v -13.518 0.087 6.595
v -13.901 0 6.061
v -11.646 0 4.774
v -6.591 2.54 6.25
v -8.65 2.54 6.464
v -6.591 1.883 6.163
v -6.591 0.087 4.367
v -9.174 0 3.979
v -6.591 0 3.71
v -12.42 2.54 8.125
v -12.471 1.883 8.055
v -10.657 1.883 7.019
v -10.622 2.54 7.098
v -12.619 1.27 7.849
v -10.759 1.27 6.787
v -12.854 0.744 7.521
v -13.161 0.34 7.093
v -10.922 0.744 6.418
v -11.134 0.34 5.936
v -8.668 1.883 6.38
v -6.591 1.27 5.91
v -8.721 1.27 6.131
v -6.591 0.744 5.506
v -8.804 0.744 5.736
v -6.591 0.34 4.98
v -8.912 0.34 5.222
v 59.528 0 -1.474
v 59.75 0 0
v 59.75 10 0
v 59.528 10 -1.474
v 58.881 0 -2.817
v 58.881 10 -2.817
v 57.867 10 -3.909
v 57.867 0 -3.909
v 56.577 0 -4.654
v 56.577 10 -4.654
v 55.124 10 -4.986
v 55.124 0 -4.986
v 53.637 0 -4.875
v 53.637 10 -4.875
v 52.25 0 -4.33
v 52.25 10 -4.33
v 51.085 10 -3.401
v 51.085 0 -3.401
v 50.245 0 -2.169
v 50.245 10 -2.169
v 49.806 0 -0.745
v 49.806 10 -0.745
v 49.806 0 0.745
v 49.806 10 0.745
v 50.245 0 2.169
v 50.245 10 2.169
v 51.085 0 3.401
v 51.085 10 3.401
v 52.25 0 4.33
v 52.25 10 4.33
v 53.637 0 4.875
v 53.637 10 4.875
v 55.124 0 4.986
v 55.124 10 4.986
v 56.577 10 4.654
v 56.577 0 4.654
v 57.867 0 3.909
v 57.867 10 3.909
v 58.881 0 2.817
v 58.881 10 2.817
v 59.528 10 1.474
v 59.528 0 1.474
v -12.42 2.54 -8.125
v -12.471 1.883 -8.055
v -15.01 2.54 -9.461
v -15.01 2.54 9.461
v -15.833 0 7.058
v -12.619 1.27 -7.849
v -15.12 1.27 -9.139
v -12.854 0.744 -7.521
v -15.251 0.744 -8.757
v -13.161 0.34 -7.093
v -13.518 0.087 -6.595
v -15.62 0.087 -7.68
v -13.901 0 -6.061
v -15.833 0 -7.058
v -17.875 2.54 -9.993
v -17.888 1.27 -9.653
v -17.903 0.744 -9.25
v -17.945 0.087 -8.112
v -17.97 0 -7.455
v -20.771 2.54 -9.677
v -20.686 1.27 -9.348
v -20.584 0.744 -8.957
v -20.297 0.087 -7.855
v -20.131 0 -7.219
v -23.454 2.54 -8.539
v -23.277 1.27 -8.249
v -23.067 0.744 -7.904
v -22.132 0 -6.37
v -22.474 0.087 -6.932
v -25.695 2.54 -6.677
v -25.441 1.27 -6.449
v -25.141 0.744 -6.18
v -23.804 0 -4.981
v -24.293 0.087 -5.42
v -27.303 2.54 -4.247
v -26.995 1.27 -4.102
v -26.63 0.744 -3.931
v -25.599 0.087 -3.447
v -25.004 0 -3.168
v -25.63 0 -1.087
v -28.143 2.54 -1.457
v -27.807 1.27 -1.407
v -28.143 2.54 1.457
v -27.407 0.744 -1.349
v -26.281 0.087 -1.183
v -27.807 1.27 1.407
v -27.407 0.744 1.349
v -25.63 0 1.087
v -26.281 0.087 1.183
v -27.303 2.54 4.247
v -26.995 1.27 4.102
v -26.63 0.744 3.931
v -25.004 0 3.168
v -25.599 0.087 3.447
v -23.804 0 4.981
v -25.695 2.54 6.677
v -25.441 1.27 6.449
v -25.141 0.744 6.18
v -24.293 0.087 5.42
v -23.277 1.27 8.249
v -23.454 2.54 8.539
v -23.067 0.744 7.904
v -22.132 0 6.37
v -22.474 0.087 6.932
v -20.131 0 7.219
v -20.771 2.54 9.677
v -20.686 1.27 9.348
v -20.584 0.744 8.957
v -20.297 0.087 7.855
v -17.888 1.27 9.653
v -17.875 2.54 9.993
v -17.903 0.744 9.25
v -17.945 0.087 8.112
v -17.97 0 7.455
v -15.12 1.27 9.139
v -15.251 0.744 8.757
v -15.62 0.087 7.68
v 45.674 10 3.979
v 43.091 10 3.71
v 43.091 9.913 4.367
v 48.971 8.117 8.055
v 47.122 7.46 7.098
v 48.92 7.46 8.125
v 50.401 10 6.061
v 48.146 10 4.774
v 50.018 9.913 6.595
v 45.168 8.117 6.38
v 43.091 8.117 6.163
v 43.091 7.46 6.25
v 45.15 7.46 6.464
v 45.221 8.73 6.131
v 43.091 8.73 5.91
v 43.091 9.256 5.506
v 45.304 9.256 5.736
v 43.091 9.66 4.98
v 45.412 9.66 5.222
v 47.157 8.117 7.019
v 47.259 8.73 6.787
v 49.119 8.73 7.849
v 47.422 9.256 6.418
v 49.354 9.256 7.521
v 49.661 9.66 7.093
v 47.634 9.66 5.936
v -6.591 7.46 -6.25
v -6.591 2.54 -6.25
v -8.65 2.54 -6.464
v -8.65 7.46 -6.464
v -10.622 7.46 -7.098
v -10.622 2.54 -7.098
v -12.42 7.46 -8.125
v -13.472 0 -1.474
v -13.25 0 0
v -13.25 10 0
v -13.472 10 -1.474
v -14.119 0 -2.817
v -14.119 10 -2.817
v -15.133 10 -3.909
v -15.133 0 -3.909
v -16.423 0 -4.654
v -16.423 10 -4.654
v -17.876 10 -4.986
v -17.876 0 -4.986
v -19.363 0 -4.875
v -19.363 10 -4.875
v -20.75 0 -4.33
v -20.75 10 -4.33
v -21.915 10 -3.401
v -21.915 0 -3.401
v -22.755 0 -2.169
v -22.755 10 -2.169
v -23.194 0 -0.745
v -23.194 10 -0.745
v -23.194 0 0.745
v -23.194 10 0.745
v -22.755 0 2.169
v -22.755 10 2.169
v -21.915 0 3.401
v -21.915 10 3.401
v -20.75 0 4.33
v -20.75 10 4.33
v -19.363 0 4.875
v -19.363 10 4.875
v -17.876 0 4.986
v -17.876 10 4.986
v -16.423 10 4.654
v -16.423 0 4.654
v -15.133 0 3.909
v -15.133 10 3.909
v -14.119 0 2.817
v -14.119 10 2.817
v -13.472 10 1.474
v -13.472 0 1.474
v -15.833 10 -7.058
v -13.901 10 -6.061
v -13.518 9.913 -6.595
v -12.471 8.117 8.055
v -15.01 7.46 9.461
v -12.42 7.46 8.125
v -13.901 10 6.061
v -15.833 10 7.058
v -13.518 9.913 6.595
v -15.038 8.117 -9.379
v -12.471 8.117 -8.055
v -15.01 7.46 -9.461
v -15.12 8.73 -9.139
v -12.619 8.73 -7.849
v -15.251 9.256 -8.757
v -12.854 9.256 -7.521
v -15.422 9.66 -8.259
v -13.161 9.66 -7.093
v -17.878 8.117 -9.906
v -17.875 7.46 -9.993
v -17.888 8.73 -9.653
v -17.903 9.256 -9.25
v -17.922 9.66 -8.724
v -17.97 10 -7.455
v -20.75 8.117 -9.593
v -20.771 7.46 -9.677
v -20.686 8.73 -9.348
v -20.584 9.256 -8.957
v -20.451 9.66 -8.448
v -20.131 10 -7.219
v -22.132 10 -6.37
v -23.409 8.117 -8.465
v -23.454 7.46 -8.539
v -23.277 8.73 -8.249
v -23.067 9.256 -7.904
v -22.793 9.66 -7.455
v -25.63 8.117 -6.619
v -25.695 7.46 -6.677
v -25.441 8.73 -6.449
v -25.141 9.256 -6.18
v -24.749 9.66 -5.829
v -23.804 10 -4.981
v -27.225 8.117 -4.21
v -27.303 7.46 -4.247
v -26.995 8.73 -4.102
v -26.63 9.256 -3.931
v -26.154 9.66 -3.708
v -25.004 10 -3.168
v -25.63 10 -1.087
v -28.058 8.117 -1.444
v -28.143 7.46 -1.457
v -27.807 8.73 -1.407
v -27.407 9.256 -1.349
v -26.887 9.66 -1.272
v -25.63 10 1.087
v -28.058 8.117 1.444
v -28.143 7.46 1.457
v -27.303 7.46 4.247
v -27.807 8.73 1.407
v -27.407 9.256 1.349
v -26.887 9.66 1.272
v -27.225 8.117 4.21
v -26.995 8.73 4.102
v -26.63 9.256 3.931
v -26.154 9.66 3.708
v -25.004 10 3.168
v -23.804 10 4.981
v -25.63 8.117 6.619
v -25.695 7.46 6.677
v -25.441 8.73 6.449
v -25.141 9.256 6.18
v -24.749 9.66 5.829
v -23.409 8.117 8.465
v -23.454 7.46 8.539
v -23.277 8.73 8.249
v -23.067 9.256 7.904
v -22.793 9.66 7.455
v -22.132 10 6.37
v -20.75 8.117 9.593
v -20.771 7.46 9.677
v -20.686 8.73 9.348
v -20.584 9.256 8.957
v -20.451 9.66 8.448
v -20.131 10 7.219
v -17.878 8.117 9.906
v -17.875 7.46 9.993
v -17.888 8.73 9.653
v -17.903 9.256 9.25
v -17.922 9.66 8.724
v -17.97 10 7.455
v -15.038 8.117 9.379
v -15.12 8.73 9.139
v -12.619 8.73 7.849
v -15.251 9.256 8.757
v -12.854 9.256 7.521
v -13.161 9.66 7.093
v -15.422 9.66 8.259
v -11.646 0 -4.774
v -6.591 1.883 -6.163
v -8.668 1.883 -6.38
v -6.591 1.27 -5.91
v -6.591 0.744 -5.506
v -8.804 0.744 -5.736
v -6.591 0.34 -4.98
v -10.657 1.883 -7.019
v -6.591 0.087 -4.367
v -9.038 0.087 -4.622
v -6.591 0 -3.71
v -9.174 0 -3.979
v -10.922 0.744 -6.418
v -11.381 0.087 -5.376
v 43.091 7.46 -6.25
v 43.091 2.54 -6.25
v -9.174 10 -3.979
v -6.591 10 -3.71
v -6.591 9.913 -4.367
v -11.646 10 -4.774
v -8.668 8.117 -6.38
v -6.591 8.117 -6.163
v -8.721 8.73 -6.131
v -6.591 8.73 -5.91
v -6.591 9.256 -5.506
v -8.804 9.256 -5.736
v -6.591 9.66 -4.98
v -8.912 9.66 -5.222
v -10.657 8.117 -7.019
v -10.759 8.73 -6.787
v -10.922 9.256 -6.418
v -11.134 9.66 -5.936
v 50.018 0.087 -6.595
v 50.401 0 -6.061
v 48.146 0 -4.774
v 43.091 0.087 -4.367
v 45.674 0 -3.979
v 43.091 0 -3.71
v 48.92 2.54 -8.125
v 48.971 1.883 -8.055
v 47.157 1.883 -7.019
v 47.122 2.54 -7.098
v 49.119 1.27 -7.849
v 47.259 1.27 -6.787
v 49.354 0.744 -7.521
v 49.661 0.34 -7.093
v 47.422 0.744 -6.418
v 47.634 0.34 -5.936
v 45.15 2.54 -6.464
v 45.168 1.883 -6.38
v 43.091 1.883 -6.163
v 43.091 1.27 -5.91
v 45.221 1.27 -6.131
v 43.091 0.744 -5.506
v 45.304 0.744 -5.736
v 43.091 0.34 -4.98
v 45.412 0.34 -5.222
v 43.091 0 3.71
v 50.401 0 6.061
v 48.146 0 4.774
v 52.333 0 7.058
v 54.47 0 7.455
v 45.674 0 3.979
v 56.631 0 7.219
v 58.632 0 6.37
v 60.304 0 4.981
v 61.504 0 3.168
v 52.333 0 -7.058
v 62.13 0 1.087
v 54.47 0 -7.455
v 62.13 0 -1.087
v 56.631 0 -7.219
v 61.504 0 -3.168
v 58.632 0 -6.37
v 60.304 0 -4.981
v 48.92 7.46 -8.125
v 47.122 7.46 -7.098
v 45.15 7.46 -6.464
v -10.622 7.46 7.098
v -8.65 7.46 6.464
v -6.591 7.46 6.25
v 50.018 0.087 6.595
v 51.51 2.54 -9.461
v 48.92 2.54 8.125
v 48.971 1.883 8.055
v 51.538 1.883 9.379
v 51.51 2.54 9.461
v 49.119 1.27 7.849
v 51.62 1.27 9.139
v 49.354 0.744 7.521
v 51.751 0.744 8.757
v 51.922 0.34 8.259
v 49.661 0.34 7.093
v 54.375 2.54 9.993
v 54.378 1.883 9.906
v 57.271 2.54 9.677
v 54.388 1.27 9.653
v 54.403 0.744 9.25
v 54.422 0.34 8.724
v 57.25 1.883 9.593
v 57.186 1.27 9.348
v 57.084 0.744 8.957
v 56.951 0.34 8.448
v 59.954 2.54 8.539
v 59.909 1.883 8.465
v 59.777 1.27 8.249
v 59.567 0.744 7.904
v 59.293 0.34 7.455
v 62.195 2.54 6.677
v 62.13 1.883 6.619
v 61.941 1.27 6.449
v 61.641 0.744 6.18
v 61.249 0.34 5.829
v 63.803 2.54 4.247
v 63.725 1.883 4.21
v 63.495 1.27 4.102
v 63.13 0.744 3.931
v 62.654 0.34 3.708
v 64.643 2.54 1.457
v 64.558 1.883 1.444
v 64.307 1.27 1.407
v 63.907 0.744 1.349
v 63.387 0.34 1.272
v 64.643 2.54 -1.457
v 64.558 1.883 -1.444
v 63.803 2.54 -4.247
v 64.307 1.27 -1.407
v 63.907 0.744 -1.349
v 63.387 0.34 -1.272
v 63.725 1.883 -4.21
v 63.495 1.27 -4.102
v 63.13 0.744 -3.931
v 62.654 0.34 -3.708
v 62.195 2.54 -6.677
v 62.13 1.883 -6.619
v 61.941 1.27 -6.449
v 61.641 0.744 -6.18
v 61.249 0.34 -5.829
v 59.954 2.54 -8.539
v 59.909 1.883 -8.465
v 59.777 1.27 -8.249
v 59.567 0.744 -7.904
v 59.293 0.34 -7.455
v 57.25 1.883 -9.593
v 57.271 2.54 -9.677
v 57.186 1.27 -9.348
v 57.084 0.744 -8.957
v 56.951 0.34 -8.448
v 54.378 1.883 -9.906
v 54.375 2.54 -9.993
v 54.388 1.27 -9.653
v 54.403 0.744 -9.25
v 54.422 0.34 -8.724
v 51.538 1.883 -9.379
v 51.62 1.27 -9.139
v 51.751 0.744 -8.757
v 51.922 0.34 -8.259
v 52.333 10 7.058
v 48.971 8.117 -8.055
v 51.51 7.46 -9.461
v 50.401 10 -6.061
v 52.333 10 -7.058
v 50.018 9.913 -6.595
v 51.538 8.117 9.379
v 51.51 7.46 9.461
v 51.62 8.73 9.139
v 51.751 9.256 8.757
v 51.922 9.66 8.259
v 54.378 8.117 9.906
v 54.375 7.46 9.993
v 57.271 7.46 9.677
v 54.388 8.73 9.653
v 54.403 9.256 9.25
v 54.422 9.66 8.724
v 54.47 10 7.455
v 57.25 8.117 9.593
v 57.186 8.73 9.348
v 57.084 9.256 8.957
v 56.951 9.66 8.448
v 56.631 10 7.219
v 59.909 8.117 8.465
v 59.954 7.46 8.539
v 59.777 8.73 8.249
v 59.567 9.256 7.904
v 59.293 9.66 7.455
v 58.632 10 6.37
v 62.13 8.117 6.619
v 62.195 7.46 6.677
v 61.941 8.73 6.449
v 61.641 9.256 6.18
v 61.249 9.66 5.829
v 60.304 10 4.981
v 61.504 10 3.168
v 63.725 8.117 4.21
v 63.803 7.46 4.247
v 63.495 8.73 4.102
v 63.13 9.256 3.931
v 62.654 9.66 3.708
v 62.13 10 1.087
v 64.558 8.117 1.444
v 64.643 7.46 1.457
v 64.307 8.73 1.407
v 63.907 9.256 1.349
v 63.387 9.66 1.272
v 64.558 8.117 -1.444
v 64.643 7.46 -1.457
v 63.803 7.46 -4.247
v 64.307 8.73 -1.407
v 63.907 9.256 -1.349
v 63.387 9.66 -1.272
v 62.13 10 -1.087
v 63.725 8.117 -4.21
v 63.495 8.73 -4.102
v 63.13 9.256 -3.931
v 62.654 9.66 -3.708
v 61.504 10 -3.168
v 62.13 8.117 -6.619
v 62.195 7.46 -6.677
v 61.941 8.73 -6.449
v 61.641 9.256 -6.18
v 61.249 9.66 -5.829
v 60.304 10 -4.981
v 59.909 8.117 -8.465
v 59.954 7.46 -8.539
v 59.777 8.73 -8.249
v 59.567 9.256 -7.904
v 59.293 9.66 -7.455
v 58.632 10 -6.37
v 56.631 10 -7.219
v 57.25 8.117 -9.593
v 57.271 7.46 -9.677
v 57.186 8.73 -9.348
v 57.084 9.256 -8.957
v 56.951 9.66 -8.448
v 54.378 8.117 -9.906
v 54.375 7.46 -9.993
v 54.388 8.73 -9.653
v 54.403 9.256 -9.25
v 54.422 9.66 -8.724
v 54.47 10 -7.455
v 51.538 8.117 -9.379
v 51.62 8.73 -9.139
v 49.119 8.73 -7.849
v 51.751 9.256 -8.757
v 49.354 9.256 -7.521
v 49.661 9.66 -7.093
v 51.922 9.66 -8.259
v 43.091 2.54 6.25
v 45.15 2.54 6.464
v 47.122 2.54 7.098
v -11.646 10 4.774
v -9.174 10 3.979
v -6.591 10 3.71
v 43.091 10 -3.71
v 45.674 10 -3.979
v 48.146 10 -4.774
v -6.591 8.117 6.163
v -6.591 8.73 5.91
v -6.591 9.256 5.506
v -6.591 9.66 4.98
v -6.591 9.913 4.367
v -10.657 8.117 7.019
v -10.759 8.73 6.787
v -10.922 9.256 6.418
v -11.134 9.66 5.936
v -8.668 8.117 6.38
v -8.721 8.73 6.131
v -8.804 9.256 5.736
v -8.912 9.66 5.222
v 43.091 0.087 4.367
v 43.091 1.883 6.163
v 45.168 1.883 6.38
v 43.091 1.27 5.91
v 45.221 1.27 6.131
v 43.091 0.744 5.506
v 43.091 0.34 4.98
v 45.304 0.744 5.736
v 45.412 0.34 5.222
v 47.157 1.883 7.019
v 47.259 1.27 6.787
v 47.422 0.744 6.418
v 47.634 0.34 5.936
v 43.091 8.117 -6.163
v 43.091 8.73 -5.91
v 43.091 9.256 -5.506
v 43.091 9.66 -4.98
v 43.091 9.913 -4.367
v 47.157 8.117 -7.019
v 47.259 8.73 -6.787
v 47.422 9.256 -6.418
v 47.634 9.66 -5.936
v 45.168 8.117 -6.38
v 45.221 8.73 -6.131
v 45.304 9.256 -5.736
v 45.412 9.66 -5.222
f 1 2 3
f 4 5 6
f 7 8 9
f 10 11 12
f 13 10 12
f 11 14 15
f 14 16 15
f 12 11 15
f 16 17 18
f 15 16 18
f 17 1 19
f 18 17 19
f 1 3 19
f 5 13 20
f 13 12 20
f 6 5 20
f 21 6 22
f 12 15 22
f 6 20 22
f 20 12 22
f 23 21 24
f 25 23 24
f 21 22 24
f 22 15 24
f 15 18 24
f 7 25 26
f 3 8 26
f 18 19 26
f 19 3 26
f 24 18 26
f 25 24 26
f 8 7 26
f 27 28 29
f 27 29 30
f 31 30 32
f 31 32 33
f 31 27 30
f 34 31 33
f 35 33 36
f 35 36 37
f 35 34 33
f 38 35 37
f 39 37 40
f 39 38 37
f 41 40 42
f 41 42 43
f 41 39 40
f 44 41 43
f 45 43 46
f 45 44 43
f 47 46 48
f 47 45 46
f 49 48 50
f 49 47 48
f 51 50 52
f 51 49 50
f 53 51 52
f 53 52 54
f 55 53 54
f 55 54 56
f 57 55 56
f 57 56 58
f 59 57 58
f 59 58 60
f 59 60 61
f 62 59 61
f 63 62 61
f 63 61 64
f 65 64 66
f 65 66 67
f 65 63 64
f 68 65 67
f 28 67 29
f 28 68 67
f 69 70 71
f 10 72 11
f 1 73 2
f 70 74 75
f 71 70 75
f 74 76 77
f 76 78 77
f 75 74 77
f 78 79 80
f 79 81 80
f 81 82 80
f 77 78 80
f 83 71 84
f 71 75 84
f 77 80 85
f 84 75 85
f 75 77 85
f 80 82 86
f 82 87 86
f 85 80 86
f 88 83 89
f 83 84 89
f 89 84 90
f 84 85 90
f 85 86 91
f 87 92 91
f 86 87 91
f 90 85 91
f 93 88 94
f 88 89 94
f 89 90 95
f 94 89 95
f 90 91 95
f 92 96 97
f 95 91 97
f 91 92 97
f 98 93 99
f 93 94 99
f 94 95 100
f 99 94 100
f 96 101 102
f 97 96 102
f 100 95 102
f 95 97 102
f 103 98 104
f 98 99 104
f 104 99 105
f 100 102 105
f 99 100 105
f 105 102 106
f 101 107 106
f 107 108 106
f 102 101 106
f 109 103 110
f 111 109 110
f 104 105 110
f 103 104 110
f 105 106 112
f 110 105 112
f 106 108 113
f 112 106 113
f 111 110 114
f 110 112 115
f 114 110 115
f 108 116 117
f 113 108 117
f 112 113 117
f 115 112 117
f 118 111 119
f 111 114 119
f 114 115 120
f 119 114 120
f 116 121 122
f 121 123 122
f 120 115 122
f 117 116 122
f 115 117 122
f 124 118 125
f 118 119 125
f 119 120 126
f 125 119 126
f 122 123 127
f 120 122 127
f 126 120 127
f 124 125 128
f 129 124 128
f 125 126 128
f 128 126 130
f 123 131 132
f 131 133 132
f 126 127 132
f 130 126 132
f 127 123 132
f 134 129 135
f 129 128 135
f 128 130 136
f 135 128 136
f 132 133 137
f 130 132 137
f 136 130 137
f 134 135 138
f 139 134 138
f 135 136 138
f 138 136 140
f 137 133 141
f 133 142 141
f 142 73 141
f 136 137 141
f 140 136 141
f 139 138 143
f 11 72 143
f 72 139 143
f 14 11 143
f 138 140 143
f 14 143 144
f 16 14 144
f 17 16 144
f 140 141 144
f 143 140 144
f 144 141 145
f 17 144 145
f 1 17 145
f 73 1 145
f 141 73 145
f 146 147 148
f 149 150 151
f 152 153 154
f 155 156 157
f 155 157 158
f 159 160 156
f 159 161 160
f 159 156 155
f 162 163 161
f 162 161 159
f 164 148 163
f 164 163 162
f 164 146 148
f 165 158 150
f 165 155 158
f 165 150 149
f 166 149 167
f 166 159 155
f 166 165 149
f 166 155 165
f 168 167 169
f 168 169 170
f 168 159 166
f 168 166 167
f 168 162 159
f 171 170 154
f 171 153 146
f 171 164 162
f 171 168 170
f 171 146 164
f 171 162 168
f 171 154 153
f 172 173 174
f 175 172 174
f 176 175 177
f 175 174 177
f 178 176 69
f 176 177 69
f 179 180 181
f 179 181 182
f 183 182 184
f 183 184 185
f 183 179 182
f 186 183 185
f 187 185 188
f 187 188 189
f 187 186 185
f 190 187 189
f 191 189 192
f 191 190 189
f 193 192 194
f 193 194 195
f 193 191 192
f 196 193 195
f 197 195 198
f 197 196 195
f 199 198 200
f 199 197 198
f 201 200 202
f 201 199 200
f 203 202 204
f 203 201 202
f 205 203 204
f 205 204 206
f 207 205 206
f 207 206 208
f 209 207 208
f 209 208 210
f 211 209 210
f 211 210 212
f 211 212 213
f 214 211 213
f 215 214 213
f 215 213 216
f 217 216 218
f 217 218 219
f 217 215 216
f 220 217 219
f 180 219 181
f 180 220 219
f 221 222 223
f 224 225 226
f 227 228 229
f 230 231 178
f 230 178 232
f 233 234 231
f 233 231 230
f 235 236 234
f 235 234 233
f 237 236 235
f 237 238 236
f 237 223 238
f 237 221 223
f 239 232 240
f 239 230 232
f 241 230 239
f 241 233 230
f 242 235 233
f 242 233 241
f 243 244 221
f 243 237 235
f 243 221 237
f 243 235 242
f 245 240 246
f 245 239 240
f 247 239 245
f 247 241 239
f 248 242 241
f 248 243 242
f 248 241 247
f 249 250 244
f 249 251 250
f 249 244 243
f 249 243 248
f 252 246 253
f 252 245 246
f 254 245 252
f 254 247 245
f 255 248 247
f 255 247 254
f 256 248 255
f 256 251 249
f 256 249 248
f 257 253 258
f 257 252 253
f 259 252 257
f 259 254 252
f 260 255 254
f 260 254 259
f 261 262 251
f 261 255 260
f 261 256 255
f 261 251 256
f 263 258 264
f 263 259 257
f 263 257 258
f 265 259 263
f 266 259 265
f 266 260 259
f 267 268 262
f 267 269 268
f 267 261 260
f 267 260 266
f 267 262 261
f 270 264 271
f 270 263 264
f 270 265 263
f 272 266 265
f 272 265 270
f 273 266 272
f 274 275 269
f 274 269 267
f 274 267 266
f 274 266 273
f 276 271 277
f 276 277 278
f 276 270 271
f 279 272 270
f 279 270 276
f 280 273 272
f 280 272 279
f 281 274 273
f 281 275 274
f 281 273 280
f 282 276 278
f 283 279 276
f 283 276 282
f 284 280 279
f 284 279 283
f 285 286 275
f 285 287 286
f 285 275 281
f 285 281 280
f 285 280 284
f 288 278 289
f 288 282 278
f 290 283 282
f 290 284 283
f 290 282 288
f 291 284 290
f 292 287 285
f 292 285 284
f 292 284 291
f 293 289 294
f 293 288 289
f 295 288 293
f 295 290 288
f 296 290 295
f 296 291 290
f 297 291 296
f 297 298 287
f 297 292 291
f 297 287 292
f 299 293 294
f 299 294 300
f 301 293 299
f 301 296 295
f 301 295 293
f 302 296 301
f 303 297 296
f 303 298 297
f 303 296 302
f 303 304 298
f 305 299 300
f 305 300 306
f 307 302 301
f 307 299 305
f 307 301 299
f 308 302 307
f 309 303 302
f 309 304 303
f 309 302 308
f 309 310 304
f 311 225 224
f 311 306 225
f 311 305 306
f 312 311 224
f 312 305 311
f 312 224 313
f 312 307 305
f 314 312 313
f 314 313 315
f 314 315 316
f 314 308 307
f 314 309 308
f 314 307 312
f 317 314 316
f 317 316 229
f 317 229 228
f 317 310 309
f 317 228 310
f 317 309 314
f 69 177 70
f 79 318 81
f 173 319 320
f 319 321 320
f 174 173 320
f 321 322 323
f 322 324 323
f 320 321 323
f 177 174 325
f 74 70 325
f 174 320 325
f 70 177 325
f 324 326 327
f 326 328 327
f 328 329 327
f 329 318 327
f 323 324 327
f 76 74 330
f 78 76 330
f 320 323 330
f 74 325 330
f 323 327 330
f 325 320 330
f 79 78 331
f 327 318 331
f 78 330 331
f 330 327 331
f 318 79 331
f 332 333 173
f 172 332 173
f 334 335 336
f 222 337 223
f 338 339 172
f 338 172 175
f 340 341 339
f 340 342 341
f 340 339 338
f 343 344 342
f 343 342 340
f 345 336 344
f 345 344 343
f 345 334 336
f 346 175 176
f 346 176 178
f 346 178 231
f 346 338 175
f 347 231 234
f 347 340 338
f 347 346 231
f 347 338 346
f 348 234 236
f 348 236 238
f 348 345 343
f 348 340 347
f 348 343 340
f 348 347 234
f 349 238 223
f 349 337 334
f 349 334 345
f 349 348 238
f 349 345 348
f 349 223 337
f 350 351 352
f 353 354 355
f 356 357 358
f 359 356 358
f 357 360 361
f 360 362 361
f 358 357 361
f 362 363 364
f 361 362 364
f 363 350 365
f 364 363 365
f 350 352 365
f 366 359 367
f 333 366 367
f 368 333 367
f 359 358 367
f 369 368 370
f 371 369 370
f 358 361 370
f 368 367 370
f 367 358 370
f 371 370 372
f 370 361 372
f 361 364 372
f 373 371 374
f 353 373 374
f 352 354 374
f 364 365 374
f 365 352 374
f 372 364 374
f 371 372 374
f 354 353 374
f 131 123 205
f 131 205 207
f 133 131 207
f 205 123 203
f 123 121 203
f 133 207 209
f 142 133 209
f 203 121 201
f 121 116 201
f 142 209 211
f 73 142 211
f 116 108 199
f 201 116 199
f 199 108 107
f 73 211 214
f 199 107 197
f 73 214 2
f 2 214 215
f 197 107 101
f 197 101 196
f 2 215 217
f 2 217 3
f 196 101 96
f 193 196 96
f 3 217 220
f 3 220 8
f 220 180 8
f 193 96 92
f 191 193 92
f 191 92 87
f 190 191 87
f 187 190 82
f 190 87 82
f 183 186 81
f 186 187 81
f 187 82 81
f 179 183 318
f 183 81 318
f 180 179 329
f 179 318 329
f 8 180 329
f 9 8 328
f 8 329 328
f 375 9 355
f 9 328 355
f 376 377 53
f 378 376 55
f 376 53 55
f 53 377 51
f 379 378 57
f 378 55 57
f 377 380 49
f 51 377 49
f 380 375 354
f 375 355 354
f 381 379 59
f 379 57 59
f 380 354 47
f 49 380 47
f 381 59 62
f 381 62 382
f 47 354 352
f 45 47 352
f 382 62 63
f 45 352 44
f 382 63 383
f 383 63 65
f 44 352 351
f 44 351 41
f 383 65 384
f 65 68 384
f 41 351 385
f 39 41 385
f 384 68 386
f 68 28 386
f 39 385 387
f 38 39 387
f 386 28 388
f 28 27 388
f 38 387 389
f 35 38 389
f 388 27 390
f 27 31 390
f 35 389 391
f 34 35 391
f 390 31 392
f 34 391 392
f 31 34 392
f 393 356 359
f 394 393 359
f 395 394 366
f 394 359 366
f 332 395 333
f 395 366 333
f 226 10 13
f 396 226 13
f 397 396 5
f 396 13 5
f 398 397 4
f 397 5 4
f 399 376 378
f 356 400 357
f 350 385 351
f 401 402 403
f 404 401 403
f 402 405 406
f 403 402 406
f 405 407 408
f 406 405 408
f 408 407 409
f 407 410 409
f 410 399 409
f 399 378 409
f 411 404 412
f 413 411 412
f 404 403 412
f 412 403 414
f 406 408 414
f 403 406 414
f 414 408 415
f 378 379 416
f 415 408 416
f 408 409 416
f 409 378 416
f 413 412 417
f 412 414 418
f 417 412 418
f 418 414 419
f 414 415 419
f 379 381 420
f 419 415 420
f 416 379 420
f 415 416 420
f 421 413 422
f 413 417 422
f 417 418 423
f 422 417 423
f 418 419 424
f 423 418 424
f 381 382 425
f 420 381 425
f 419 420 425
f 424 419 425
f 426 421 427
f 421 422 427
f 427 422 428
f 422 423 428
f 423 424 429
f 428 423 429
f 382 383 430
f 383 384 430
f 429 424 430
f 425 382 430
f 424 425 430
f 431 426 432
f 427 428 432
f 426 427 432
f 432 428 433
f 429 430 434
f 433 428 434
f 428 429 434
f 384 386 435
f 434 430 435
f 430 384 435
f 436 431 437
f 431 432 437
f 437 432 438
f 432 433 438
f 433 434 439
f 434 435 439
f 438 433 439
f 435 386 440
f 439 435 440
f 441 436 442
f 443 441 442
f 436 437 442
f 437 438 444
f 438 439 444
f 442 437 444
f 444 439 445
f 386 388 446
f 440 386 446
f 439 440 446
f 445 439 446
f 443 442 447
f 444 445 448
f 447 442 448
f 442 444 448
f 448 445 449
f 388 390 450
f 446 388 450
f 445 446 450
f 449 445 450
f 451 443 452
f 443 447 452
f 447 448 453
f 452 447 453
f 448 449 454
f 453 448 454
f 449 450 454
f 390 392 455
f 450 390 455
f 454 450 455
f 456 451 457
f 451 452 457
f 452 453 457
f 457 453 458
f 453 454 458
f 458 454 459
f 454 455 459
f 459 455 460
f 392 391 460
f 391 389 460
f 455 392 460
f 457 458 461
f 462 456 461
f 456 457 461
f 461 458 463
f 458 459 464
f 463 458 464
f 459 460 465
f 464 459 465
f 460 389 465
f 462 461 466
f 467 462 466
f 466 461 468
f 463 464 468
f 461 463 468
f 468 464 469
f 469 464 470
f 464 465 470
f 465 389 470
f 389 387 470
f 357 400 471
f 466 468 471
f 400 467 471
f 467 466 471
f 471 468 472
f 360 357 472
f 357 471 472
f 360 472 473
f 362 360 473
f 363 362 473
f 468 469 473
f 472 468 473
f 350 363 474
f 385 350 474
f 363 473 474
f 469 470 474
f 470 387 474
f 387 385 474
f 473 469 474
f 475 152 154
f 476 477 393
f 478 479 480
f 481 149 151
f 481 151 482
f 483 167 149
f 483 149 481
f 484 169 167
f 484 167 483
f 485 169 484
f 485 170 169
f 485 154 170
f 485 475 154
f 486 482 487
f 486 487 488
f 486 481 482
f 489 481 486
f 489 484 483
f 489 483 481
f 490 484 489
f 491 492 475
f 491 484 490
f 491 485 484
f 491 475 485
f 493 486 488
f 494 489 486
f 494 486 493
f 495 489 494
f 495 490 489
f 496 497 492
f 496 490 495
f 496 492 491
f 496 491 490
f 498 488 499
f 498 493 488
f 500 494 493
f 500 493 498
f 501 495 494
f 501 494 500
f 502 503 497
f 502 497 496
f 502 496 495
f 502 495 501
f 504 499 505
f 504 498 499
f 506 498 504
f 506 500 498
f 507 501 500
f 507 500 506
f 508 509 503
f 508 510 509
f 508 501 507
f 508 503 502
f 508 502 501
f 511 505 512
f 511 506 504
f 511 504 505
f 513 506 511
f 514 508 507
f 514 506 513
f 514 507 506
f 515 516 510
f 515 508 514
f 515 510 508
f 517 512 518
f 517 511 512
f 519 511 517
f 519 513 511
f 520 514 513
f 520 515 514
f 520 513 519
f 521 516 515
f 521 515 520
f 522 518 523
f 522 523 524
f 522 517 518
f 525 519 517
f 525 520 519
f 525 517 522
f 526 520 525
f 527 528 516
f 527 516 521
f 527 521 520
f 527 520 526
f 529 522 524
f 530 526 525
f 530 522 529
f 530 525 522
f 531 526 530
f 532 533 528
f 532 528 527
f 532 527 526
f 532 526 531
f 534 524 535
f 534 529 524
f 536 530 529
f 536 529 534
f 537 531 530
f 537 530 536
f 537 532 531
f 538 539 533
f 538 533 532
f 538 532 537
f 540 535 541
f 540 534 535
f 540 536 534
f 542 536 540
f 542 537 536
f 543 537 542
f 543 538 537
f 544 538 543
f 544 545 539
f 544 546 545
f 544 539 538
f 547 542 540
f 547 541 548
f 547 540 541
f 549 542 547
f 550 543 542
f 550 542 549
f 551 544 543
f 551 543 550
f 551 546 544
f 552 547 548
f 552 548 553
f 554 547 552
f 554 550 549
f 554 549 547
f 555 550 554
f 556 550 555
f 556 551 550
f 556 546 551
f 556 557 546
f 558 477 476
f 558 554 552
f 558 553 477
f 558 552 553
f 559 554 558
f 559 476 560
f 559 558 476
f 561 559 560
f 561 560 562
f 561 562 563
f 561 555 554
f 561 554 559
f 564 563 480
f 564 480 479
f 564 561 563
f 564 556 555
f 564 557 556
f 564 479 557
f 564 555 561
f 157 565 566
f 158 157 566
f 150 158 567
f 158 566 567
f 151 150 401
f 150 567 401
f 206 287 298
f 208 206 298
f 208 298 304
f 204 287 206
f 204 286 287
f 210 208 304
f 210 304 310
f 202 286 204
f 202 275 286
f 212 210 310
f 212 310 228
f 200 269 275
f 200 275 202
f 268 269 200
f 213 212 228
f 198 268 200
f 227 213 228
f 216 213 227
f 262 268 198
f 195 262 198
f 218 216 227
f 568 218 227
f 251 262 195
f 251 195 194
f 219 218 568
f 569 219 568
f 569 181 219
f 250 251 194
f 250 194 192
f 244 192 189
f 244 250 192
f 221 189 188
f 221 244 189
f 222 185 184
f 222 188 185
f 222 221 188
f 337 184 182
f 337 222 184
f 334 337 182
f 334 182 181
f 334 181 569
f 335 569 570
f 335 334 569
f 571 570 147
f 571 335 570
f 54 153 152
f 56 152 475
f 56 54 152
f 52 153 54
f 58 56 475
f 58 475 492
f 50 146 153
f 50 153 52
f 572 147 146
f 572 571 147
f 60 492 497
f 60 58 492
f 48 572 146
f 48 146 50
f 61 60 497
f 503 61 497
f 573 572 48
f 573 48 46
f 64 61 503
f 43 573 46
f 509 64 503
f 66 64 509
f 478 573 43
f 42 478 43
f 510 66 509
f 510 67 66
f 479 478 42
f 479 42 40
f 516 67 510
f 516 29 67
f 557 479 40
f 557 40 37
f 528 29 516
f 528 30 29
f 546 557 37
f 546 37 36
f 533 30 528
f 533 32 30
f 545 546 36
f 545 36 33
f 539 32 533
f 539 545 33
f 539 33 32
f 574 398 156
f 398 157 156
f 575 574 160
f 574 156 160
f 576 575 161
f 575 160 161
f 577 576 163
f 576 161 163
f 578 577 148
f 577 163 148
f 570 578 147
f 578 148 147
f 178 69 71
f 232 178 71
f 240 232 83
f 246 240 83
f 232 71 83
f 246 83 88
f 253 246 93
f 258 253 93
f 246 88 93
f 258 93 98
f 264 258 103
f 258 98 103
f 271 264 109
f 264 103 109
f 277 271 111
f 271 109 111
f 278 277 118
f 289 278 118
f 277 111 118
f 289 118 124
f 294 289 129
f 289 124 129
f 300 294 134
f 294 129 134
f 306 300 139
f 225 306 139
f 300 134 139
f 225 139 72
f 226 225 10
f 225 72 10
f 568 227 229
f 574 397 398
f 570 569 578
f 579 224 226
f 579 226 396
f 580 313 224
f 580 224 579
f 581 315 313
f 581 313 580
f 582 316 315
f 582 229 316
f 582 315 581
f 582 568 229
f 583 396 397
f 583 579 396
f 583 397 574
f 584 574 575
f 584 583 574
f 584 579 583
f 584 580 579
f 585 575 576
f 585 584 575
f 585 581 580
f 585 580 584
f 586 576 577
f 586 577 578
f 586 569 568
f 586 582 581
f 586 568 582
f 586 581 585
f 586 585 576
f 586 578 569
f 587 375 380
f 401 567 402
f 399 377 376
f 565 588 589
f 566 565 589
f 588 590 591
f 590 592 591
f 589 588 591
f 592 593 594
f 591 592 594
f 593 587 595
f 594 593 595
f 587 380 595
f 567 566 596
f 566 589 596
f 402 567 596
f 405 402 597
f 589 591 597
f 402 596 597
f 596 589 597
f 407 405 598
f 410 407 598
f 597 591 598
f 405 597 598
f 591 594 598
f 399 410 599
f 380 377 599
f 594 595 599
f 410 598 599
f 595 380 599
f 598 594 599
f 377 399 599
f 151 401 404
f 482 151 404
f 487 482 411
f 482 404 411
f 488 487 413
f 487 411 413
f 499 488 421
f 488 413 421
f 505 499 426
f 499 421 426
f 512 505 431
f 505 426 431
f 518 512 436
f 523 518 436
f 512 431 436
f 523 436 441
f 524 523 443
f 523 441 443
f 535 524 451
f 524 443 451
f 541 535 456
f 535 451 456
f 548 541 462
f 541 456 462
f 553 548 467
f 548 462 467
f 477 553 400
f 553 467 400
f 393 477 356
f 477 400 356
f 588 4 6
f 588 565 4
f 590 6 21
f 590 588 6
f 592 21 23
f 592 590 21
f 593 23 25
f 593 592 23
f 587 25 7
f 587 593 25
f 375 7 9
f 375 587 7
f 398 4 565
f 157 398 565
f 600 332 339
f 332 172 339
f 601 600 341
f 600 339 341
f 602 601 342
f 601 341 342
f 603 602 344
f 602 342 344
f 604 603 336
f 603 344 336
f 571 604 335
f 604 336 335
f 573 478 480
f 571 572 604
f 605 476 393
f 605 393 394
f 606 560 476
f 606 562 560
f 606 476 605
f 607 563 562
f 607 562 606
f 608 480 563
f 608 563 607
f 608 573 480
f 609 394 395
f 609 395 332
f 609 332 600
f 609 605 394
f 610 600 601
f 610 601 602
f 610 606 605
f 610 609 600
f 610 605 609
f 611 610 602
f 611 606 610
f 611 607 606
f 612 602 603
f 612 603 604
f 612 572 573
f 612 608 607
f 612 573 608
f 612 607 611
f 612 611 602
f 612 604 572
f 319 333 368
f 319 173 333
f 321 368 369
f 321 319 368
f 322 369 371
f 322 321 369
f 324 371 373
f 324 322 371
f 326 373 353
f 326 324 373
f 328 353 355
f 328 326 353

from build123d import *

# Parameters (mm, degrees)
SKETCH1_R           = 5
BOSS_EXTRUDE1_DEPTH = 10
FILLET1_R           = 2.54


with BuildPart() as part:
    # Sketch1 → Boss-Extrude1 (new body)
    with BuildSketch(Plane(origin=(0, 0, 0), x_dir=(1, 0, 0), z_dir=(0, 1, 0))):
        with BuildLine():
            Line((-6.590776184, -6.25), (43.090776184, -6.25))
            ThreePointArc((43.090776184, -6.25), (46.152638362, -6.730283618), (48.920388092, -8.125))
            ThreePointArc((48.920388092, -8.125), (64.75, 0), (48.920388092, 8.125))
            ThreePointArc((48.920388092, 8.125), (46.152638362, 6.730283618), (43.090776184, 6.25))
            Line((43.090776184, 6.25), (-6.590776184, 6.25))
            ThreePointArc((-6.590776184, 6.25), (-9.652638362, 6.730283618), (-12.420388092, 8.125))
            ThreePointArc((-12.420388092, 8.125), (-28.25, 0), (-12.420388092, -8.125))
            ThreePointArc((-12.420388092, -8.125), (-9.652638362, -6.730283618), (-6.590776184, -6.25))
        make_face()
        with Locations((-18.25, 0)):
            Circle(SKETCH1_R, mode=Mode.SUBTRACT)
        with Locations((54.75, 0)):
            Circle(SKETCH1_R, mode=Mode.SUBTRACT)
    extrude(amount=BOSS_EXTRUDE1_DEPTH)

    # Fillet1
    fillet1_edges = [part.edges().sort_by_distance(p)[0] for p in [
        (-9.652638362, 10, 6.730283618),
        (-28.25, 0, 0),
        (-9.652638362, 0, -6.730283618),
        (18.25, 10, 6.25),
        (46.152638362, 10, 6.730283618),
        (64.75, 10, 0),
        (46.152638362, 10, -6.730283618),
        (18.25, 10, -6.25),
        (-9.652638362, 10, -6.730283618),
        (-28.25, 10, 0),
        (18.25, 0, -6.25),
        (46.152638362, 0, -6.730283618),
        (64.75, 0, 0),
        (46.152638362, 0, 6.730283618),
        (18.25, 0, 6.25),
        (-9.652638362, 0, 6.730283618),
    ]]
    fillet(fillet1_edges, radius=FILLET1_R)


solid = part.part
